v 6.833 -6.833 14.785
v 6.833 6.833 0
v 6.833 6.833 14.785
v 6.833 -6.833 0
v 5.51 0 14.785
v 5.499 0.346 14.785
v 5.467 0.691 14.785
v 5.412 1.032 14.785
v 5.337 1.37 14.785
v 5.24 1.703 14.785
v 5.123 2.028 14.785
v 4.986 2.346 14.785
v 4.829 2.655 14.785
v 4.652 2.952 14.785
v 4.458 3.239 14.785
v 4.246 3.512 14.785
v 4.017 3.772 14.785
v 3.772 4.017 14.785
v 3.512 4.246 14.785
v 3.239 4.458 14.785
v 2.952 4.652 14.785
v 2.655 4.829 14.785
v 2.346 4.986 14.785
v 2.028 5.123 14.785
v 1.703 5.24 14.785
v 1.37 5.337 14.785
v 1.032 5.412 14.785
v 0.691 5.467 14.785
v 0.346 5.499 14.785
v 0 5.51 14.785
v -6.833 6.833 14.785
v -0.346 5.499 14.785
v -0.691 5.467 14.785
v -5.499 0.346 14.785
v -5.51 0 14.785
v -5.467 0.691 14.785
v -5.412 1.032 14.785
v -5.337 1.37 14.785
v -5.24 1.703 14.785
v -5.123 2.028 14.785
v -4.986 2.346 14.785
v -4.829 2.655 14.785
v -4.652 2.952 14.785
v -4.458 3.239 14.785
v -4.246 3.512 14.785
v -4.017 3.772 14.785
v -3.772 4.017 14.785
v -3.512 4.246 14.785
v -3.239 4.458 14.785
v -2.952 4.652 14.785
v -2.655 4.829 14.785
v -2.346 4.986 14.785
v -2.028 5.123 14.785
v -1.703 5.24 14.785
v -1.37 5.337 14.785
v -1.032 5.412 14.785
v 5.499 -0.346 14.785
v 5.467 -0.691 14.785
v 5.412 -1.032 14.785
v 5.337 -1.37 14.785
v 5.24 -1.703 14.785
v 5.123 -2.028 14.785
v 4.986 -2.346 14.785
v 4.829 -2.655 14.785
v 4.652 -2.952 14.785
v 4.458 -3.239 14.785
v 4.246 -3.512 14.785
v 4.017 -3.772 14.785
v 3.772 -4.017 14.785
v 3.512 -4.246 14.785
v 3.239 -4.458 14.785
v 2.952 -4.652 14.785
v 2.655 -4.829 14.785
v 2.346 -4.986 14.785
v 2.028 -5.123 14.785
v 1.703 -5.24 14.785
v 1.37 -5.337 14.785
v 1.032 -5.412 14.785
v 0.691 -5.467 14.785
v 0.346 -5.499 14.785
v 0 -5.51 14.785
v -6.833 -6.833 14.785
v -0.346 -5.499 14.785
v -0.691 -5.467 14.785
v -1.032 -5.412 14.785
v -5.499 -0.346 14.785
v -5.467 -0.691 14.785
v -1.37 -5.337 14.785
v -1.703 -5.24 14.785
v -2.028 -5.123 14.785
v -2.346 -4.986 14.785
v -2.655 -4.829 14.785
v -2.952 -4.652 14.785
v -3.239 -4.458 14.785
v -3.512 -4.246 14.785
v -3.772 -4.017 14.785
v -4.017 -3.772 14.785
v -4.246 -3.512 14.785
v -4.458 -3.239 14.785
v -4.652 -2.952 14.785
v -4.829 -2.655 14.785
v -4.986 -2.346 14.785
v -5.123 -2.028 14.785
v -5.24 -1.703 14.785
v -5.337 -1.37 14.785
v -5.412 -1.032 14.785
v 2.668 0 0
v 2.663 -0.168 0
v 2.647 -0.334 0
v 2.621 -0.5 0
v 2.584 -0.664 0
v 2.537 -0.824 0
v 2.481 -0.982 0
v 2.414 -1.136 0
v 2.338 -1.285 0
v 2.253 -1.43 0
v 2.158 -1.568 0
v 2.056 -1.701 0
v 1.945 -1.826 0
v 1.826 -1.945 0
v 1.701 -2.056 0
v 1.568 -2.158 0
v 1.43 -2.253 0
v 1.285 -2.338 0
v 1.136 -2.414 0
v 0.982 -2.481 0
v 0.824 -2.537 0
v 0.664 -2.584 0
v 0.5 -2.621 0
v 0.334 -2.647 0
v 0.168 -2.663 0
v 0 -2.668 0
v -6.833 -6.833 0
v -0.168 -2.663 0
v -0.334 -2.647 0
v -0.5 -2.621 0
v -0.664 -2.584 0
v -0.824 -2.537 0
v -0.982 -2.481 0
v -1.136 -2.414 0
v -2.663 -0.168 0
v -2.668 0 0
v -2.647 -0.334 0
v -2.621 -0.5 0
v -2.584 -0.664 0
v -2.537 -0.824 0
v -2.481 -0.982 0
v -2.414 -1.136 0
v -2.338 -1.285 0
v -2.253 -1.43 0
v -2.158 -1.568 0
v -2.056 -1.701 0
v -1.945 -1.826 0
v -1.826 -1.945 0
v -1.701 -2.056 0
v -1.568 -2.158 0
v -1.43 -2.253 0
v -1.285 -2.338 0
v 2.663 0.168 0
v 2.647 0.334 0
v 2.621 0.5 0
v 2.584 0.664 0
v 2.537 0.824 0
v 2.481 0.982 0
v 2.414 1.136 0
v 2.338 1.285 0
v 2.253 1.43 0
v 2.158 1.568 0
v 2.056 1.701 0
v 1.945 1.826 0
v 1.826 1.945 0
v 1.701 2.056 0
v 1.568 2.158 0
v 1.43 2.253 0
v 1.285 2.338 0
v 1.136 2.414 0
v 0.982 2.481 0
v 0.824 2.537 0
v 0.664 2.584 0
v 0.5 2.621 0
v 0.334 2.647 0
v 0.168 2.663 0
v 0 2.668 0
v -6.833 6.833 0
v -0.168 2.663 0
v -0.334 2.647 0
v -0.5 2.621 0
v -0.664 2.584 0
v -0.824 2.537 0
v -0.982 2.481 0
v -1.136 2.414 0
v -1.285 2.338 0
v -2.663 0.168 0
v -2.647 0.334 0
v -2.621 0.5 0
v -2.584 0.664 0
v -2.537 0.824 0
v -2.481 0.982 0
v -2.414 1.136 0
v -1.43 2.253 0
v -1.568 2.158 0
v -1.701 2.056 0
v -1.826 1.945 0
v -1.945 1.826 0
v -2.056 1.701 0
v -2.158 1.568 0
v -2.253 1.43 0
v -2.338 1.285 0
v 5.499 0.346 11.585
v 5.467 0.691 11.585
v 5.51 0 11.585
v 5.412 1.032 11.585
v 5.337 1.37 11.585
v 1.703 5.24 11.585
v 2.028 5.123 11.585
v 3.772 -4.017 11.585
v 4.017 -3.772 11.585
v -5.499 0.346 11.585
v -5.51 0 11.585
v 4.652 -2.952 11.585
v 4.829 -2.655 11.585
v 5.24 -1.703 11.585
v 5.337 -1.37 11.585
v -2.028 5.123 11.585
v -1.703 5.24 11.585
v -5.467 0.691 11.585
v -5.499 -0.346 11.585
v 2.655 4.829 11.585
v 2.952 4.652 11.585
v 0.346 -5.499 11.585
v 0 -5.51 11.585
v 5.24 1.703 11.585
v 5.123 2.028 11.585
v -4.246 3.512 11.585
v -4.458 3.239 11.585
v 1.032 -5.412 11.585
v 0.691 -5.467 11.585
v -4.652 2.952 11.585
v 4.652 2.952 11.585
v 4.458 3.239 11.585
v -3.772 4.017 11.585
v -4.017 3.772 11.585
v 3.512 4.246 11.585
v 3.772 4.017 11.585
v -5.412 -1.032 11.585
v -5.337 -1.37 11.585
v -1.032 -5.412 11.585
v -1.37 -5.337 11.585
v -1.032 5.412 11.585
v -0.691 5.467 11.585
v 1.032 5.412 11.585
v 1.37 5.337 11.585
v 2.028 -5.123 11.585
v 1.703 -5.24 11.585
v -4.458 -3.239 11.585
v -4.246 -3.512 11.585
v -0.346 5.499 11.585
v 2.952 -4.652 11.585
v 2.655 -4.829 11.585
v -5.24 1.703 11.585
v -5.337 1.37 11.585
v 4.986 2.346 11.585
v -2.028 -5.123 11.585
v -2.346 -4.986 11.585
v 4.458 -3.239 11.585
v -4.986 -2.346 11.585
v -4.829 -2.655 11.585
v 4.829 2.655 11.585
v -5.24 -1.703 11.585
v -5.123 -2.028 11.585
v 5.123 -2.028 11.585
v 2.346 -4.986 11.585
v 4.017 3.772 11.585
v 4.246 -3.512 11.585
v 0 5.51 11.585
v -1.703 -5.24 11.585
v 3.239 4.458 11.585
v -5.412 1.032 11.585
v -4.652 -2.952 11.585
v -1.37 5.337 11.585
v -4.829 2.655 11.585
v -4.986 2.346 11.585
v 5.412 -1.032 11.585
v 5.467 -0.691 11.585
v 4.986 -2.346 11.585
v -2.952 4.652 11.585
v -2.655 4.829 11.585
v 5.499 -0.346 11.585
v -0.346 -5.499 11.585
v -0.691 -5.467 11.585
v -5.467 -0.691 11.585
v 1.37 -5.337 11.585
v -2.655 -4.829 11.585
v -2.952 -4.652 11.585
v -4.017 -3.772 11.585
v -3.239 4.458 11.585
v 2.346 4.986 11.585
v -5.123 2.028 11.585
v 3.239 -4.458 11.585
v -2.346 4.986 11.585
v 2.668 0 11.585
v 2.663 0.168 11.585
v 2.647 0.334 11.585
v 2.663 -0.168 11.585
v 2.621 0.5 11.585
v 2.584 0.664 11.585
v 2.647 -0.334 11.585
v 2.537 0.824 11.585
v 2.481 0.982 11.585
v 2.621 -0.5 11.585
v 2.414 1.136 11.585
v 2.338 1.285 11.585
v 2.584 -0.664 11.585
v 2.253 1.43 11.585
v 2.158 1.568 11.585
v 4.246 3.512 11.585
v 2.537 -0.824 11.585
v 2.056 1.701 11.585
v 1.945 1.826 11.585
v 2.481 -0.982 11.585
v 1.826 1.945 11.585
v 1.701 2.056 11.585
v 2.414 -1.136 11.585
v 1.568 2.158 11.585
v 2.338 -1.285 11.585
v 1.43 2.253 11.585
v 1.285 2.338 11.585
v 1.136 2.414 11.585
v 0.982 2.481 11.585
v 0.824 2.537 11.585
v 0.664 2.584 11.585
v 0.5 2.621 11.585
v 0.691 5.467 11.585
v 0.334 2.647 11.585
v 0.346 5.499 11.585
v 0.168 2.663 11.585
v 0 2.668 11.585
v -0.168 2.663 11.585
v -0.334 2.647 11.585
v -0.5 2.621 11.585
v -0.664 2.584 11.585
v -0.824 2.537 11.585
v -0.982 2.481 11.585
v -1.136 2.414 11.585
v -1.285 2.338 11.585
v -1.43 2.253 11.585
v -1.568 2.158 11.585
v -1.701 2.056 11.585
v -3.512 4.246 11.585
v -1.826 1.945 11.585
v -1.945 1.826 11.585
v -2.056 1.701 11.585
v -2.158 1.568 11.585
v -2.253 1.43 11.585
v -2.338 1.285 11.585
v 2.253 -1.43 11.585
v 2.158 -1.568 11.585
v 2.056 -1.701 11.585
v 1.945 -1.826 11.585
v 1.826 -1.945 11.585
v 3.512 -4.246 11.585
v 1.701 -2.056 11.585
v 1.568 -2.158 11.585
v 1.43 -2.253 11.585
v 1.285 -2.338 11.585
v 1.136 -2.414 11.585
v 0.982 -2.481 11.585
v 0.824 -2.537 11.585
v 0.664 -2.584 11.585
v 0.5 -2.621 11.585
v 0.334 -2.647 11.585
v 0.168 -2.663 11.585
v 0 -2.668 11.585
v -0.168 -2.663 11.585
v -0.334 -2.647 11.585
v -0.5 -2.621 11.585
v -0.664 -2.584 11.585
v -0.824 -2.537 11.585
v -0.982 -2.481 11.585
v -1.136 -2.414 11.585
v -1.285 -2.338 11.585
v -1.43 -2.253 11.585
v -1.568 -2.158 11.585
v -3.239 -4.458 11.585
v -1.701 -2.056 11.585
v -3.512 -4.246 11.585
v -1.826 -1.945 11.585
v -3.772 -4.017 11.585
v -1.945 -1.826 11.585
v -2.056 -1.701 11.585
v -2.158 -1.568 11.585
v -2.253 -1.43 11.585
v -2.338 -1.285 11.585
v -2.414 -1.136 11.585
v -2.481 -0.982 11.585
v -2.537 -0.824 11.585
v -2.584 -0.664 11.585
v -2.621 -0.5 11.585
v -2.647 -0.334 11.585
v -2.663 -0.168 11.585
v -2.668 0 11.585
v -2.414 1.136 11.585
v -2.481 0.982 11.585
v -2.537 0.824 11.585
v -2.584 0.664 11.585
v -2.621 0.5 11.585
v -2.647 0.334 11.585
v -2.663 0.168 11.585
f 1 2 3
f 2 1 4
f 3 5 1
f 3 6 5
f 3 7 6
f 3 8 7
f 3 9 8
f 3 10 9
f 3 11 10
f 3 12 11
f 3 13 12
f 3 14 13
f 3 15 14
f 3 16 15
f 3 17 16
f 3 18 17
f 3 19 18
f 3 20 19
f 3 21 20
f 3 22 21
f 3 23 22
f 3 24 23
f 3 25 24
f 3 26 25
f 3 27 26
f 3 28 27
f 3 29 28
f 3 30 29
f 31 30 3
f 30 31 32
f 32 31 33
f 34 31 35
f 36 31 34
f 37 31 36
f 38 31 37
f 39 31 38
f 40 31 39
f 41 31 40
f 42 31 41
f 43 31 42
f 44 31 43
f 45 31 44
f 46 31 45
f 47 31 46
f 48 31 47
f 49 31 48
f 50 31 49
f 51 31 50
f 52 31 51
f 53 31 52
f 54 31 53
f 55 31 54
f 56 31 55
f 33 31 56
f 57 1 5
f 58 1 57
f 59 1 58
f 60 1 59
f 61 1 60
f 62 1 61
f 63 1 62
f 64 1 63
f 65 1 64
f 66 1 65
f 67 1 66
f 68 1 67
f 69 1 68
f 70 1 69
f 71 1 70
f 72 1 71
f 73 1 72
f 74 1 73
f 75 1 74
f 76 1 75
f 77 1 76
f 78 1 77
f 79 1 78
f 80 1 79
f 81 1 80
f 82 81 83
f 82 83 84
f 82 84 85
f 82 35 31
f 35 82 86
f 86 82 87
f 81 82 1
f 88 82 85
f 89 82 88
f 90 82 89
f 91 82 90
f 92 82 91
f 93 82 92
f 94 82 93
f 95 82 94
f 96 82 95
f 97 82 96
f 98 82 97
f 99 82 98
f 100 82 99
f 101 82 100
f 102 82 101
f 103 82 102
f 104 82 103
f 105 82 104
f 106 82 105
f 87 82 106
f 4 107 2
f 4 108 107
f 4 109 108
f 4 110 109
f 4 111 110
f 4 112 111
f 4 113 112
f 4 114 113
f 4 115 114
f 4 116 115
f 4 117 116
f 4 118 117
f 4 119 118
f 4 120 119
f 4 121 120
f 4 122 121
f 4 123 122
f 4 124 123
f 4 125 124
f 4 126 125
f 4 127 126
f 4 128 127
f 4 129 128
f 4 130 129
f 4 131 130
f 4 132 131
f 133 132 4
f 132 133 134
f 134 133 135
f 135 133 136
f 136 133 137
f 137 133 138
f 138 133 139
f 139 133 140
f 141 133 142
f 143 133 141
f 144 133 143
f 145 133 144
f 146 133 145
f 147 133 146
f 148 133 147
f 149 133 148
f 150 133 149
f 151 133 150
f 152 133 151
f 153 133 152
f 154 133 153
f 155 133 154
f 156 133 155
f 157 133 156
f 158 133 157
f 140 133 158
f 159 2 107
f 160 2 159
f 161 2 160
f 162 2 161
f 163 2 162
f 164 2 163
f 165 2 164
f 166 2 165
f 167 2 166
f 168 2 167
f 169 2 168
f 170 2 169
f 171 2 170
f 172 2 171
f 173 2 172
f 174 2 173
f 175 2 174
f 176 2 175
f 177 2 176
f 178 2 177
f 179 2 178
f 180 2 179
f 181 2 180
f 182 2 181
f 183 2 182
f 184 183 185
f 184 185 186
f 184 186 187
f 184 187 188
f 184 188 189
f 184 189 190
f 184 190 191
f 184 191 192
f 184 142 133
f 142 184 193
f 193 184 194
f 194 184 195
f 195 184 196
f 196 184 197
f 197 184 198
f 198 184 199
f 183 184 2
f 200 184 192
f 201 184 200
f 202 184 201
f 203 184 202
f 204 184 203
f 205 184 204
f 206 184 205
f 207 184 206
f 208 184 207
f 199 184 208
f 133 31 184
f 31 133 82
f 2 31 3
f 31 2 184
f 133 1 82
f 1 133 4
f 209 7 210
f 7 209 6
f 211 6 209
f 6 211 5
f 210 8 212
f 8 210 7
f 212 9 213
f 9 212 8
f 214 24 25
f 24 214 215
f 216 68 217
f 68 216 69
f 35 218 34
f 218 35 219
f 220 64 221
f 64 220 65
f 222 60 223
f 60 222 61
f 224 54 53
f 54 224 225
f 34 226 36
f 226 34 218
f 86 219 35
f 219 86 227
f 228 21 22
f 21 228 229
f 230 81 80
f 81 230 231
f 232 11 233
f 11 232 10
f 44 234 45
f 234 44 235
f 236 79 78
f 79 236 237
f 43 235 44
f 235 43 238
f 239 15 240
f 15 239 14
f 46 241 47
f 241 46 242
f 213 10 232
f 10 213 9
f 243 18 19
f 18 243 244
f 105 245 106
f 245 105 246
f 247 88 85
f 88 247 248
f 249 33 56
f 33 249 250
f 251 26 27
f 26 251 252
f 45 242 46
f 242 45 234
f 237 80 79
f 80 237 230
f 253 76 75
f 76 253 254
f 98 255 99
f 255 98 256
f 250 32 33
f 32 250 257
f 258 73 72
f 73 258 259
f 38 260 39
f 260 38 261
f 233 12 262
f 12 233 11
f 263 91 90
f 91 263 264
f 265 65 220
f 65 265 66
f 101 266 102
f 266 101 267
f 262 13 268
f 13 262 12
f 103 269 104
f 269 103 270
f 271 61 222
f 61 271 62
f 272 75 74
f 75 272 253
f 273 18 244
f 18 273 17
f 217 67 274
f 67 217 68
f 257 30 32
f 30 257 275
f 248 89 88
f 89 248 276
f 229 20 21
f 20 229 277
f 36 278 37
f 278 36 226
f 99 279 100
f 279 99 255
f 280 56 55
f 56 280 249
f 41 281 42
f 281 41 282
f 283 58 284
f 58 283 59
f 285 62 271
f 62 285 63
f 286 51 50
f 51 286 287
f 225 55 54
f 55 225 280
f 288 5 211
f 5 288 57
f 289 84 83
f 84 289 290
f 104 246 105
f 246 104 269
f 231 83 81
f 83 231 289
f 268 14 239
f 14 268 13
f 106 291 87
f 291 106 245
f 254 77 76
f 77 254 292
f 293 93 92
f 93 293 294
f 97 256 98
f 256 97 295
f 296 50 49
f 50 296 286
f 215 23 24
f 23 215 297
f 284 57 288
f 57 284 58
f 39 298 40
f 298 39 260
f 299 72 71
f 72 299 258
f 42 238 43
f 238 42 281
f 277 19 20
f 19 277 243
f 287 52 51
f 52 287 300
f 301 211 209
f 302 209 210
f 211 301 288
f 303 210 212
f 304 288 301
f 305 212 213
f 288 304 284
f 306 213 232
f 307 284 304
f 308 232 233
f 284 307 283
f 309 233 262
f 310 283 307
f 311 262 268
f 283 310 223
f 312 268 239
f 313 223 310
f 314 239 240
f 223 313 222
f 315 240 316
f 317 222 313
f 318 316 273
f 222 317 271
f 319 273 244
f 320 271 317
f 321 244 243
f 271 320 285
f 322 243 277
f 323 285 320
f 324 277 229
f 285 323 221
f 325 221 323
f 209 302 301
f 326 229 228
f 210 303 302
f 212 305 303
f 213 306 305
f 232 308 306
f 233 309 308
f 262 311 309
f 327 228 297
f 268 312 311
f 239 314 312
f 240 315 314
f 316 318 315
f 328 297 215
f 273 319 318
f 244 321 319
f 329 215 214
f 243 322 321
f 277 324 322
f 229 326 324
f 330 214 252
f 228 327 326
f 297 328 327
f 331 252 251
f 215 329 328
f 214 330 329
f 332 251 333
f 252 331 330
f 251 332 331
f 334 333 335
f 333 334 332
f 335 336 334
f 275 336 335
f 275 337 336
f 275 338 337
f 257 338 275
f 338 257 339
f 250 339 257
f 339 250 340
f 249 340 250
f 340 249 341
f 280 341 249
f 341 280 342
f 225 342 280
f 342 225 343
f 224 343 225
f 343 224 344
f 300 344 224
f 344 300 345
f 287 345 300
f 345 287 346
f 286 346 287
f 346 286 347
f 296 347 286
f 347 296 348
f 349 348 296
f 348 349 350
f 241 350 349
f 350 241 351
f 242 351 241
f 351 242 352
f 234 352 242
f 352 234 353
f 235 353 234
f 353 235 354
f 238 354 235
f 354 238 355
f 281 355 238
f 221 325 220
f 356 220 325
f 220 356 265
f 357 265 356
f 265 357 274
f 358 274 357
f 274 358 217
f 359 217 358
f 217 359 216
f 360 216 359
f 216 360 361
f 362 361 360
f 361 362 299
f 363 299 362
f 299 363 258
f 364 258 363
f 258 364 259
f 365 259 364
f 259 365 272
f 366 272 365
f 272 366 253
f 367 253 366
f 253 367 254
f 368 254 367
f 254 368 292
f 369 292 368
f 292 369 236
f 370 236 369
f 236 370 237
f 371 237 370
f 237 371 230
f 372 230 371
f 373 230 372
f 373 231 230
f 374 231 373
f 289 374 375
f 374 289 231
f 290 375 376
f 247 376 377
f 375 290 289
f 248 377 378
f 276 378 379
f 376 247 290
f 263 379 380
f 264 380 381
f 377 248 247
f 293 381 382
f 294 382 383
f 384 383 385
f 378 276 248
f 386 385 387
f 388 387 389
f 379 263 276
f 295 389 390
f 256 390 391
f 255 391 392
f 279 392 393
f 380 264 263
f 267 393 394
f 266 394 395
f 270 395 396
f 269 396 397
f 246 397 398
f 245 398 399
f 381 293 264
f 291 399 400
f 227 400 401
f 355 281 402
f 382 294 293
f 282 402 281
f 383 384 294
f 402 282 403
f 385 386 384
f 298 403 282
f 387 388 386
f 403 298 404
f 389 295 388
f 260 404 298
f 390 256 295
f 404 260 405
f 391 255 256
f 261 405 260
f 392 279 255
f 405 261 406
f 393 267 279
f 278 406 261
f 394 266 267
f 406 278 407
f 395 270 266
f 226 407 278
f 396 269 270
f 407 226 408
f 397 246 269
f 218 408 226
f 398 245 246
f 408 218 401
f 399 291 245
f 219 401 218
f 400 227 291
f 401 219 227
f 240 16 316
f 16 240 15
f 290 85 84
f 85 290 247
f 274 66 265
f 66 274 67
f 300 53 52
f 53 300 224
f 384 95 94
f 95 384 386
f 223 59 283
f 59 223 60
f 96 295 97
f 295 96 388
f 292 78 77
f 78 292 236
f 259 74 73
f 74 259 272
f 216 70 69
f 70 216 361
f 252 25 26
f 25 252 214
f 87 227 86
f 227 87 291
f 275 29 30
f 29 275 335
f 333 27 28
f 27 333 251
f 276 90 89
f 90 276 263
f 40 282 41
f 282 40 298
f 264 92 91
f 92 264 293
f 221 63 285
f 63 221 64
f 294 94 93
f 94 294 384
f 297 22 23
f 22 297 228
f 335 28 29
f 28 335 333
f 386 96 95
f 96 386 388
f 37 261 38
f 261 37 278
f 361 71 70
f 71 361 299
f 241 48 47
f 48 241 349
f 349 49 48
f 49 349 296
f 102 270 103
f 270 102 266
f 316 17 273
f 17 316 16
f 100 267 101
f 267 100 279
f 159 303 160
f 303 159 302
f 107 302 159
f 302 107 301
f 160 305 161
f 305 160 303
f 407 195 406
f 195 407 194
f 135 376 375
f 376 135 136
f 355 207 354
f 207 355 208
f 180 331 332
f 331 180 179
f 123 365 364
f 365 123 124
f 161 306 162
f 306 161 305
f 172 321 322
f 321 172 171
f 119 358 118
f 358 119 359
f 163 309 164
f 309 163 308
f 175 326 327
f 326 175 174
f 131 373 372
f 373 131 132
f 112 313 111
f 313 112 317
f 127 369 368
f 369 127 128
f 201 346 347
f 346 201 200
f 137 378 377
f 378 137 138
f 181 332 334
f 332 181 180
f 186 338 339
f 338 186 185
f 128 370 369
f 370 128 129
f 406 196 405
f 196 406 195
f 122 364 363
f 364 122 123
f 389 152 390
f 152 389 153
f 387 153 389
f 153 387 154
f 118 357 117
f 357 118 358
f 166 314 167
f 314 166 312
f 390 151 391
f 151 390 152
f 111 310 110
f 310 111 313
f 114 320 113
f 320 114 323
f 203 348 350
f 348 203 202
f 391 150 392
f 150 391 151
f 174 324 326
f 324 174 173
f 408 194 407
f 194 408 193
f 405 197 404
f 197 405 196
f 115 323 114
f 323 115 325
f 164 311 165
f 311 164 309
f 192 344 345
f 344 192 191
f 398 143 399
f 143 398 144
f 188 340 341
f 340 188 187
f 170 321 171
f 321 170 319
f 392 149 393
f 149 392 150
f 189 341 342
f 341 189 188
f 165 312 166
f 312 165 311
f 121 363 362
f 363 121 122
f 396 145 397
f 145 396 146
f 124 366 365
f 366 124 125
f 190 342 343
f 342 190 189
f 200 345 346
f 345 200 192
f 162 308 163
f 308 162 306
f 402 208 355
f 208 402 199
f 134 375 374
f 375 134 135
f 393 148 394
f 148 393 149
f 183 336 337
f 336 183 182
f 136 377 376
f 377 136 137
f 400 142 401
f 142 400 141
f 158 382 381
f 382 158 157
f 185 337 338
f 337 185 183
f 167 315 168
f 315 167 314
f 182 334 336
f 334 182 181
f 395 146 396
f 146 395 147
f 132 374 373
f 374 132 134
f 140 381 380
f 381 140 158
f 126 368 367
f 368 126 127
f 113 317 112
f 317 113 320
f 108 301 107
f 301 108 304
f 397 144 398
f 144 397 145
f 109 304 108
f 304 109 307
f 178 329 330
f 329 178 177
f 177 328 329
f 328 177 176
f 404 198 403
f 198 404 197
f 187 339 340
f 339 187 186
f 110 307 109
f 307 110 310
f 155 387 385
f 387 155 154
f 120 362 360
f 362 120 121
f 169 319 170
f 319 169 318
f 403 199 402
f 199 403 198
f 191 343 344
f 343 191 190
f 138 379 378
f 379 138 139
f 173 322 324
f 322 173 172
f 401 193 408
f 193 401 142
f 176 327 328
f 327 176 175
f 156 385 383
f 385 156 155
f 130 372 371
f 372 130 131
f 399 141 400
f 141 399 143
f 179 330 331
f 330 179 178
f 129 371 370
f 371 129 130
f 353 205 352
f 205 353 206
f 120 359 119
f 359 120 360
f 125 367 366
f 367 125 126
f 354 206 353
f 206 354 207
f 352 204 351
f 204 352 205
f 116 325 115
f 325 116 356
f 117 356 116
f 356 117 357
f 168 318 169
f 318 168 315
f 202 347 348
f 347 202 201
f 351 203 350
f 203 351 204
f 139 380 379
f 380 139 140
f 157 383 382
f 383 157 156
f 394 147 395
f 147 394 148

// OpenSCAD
echo(version());

UNIT = 25.4;
$fn = 100;

module mount_hole(depth, sz=3) {
  if (sz==3) { r = 0.3 * UNIT; }
  else if (sz==4) { r = 0.4 * UNIT; }
  else { r = 0.3 * UNIT; }
  
  linear_extrude(2*depth, center=true) circle(1.25 * r, $fn=$fn);
}

/*
Generates a nut boss that seats a captive nut in the piece.
*/
module m4_nut_boss(l, p=3.17, vp=3.17) {
  m = 4; // (mm) diameter of m4 bolt
  g = 7.66; // (mm) major diameter of m4 hex nut
  h = 3.2; //(mm) max height of m4 hex nut
  
  p = 3.17; // (mm) horizontal padding
  vp = 3.17 / 2; // (mm) vertical padding
  
  L = g + p;
  H = l+h+vp;
  
  eps = 1.05; //corrective multiplier
  
  difference() {
    translate(v=[-L/2, -L/2, 0]) cube([L, L, H], $fn=$fn);
    translate([0, 0, vp+l]) cylinder(h=h, d=eps*g, $fn=$fn);
    cylinder(h=H, d=eps*m, $fn=$fn); // 1.1d to account for print shrinkage
  }
}

/*
Generates a nut boss that seats a captive nut in the piece.
*/
module mx_nut_boss(l, p=3.17, vp=3.17) {
  m = 4.62 * 1.1; // (mm) diameter of m4 bolt
  g = 10.82 * .97; // (mm) major diameter of m4 hex nut
  h = 3.2; //(mm) max height of m4 hex nut
  
  p = 3.17; // (mm) horizontal padding
  vp = 3.17 / 2; // (mm) vertical padding
  
  L = g + p;
  H = l+h+vp;
  
  eps = 1.05; //corrective multiplier
  
  difference() {
    translate(v=[-L/2, -L/2, 0]) cube([L, L, H], $fn=$fn); // outer shape
    translate([0, 0, vp+l]) cylinder(h=h, d=eps*g, $fn=$fn); // nut seat
    cylinder(h=H, d=eps*m, $fn=$fn); // bolt hole
  }
}

mx_nut_boss(10, vp=6.34);
